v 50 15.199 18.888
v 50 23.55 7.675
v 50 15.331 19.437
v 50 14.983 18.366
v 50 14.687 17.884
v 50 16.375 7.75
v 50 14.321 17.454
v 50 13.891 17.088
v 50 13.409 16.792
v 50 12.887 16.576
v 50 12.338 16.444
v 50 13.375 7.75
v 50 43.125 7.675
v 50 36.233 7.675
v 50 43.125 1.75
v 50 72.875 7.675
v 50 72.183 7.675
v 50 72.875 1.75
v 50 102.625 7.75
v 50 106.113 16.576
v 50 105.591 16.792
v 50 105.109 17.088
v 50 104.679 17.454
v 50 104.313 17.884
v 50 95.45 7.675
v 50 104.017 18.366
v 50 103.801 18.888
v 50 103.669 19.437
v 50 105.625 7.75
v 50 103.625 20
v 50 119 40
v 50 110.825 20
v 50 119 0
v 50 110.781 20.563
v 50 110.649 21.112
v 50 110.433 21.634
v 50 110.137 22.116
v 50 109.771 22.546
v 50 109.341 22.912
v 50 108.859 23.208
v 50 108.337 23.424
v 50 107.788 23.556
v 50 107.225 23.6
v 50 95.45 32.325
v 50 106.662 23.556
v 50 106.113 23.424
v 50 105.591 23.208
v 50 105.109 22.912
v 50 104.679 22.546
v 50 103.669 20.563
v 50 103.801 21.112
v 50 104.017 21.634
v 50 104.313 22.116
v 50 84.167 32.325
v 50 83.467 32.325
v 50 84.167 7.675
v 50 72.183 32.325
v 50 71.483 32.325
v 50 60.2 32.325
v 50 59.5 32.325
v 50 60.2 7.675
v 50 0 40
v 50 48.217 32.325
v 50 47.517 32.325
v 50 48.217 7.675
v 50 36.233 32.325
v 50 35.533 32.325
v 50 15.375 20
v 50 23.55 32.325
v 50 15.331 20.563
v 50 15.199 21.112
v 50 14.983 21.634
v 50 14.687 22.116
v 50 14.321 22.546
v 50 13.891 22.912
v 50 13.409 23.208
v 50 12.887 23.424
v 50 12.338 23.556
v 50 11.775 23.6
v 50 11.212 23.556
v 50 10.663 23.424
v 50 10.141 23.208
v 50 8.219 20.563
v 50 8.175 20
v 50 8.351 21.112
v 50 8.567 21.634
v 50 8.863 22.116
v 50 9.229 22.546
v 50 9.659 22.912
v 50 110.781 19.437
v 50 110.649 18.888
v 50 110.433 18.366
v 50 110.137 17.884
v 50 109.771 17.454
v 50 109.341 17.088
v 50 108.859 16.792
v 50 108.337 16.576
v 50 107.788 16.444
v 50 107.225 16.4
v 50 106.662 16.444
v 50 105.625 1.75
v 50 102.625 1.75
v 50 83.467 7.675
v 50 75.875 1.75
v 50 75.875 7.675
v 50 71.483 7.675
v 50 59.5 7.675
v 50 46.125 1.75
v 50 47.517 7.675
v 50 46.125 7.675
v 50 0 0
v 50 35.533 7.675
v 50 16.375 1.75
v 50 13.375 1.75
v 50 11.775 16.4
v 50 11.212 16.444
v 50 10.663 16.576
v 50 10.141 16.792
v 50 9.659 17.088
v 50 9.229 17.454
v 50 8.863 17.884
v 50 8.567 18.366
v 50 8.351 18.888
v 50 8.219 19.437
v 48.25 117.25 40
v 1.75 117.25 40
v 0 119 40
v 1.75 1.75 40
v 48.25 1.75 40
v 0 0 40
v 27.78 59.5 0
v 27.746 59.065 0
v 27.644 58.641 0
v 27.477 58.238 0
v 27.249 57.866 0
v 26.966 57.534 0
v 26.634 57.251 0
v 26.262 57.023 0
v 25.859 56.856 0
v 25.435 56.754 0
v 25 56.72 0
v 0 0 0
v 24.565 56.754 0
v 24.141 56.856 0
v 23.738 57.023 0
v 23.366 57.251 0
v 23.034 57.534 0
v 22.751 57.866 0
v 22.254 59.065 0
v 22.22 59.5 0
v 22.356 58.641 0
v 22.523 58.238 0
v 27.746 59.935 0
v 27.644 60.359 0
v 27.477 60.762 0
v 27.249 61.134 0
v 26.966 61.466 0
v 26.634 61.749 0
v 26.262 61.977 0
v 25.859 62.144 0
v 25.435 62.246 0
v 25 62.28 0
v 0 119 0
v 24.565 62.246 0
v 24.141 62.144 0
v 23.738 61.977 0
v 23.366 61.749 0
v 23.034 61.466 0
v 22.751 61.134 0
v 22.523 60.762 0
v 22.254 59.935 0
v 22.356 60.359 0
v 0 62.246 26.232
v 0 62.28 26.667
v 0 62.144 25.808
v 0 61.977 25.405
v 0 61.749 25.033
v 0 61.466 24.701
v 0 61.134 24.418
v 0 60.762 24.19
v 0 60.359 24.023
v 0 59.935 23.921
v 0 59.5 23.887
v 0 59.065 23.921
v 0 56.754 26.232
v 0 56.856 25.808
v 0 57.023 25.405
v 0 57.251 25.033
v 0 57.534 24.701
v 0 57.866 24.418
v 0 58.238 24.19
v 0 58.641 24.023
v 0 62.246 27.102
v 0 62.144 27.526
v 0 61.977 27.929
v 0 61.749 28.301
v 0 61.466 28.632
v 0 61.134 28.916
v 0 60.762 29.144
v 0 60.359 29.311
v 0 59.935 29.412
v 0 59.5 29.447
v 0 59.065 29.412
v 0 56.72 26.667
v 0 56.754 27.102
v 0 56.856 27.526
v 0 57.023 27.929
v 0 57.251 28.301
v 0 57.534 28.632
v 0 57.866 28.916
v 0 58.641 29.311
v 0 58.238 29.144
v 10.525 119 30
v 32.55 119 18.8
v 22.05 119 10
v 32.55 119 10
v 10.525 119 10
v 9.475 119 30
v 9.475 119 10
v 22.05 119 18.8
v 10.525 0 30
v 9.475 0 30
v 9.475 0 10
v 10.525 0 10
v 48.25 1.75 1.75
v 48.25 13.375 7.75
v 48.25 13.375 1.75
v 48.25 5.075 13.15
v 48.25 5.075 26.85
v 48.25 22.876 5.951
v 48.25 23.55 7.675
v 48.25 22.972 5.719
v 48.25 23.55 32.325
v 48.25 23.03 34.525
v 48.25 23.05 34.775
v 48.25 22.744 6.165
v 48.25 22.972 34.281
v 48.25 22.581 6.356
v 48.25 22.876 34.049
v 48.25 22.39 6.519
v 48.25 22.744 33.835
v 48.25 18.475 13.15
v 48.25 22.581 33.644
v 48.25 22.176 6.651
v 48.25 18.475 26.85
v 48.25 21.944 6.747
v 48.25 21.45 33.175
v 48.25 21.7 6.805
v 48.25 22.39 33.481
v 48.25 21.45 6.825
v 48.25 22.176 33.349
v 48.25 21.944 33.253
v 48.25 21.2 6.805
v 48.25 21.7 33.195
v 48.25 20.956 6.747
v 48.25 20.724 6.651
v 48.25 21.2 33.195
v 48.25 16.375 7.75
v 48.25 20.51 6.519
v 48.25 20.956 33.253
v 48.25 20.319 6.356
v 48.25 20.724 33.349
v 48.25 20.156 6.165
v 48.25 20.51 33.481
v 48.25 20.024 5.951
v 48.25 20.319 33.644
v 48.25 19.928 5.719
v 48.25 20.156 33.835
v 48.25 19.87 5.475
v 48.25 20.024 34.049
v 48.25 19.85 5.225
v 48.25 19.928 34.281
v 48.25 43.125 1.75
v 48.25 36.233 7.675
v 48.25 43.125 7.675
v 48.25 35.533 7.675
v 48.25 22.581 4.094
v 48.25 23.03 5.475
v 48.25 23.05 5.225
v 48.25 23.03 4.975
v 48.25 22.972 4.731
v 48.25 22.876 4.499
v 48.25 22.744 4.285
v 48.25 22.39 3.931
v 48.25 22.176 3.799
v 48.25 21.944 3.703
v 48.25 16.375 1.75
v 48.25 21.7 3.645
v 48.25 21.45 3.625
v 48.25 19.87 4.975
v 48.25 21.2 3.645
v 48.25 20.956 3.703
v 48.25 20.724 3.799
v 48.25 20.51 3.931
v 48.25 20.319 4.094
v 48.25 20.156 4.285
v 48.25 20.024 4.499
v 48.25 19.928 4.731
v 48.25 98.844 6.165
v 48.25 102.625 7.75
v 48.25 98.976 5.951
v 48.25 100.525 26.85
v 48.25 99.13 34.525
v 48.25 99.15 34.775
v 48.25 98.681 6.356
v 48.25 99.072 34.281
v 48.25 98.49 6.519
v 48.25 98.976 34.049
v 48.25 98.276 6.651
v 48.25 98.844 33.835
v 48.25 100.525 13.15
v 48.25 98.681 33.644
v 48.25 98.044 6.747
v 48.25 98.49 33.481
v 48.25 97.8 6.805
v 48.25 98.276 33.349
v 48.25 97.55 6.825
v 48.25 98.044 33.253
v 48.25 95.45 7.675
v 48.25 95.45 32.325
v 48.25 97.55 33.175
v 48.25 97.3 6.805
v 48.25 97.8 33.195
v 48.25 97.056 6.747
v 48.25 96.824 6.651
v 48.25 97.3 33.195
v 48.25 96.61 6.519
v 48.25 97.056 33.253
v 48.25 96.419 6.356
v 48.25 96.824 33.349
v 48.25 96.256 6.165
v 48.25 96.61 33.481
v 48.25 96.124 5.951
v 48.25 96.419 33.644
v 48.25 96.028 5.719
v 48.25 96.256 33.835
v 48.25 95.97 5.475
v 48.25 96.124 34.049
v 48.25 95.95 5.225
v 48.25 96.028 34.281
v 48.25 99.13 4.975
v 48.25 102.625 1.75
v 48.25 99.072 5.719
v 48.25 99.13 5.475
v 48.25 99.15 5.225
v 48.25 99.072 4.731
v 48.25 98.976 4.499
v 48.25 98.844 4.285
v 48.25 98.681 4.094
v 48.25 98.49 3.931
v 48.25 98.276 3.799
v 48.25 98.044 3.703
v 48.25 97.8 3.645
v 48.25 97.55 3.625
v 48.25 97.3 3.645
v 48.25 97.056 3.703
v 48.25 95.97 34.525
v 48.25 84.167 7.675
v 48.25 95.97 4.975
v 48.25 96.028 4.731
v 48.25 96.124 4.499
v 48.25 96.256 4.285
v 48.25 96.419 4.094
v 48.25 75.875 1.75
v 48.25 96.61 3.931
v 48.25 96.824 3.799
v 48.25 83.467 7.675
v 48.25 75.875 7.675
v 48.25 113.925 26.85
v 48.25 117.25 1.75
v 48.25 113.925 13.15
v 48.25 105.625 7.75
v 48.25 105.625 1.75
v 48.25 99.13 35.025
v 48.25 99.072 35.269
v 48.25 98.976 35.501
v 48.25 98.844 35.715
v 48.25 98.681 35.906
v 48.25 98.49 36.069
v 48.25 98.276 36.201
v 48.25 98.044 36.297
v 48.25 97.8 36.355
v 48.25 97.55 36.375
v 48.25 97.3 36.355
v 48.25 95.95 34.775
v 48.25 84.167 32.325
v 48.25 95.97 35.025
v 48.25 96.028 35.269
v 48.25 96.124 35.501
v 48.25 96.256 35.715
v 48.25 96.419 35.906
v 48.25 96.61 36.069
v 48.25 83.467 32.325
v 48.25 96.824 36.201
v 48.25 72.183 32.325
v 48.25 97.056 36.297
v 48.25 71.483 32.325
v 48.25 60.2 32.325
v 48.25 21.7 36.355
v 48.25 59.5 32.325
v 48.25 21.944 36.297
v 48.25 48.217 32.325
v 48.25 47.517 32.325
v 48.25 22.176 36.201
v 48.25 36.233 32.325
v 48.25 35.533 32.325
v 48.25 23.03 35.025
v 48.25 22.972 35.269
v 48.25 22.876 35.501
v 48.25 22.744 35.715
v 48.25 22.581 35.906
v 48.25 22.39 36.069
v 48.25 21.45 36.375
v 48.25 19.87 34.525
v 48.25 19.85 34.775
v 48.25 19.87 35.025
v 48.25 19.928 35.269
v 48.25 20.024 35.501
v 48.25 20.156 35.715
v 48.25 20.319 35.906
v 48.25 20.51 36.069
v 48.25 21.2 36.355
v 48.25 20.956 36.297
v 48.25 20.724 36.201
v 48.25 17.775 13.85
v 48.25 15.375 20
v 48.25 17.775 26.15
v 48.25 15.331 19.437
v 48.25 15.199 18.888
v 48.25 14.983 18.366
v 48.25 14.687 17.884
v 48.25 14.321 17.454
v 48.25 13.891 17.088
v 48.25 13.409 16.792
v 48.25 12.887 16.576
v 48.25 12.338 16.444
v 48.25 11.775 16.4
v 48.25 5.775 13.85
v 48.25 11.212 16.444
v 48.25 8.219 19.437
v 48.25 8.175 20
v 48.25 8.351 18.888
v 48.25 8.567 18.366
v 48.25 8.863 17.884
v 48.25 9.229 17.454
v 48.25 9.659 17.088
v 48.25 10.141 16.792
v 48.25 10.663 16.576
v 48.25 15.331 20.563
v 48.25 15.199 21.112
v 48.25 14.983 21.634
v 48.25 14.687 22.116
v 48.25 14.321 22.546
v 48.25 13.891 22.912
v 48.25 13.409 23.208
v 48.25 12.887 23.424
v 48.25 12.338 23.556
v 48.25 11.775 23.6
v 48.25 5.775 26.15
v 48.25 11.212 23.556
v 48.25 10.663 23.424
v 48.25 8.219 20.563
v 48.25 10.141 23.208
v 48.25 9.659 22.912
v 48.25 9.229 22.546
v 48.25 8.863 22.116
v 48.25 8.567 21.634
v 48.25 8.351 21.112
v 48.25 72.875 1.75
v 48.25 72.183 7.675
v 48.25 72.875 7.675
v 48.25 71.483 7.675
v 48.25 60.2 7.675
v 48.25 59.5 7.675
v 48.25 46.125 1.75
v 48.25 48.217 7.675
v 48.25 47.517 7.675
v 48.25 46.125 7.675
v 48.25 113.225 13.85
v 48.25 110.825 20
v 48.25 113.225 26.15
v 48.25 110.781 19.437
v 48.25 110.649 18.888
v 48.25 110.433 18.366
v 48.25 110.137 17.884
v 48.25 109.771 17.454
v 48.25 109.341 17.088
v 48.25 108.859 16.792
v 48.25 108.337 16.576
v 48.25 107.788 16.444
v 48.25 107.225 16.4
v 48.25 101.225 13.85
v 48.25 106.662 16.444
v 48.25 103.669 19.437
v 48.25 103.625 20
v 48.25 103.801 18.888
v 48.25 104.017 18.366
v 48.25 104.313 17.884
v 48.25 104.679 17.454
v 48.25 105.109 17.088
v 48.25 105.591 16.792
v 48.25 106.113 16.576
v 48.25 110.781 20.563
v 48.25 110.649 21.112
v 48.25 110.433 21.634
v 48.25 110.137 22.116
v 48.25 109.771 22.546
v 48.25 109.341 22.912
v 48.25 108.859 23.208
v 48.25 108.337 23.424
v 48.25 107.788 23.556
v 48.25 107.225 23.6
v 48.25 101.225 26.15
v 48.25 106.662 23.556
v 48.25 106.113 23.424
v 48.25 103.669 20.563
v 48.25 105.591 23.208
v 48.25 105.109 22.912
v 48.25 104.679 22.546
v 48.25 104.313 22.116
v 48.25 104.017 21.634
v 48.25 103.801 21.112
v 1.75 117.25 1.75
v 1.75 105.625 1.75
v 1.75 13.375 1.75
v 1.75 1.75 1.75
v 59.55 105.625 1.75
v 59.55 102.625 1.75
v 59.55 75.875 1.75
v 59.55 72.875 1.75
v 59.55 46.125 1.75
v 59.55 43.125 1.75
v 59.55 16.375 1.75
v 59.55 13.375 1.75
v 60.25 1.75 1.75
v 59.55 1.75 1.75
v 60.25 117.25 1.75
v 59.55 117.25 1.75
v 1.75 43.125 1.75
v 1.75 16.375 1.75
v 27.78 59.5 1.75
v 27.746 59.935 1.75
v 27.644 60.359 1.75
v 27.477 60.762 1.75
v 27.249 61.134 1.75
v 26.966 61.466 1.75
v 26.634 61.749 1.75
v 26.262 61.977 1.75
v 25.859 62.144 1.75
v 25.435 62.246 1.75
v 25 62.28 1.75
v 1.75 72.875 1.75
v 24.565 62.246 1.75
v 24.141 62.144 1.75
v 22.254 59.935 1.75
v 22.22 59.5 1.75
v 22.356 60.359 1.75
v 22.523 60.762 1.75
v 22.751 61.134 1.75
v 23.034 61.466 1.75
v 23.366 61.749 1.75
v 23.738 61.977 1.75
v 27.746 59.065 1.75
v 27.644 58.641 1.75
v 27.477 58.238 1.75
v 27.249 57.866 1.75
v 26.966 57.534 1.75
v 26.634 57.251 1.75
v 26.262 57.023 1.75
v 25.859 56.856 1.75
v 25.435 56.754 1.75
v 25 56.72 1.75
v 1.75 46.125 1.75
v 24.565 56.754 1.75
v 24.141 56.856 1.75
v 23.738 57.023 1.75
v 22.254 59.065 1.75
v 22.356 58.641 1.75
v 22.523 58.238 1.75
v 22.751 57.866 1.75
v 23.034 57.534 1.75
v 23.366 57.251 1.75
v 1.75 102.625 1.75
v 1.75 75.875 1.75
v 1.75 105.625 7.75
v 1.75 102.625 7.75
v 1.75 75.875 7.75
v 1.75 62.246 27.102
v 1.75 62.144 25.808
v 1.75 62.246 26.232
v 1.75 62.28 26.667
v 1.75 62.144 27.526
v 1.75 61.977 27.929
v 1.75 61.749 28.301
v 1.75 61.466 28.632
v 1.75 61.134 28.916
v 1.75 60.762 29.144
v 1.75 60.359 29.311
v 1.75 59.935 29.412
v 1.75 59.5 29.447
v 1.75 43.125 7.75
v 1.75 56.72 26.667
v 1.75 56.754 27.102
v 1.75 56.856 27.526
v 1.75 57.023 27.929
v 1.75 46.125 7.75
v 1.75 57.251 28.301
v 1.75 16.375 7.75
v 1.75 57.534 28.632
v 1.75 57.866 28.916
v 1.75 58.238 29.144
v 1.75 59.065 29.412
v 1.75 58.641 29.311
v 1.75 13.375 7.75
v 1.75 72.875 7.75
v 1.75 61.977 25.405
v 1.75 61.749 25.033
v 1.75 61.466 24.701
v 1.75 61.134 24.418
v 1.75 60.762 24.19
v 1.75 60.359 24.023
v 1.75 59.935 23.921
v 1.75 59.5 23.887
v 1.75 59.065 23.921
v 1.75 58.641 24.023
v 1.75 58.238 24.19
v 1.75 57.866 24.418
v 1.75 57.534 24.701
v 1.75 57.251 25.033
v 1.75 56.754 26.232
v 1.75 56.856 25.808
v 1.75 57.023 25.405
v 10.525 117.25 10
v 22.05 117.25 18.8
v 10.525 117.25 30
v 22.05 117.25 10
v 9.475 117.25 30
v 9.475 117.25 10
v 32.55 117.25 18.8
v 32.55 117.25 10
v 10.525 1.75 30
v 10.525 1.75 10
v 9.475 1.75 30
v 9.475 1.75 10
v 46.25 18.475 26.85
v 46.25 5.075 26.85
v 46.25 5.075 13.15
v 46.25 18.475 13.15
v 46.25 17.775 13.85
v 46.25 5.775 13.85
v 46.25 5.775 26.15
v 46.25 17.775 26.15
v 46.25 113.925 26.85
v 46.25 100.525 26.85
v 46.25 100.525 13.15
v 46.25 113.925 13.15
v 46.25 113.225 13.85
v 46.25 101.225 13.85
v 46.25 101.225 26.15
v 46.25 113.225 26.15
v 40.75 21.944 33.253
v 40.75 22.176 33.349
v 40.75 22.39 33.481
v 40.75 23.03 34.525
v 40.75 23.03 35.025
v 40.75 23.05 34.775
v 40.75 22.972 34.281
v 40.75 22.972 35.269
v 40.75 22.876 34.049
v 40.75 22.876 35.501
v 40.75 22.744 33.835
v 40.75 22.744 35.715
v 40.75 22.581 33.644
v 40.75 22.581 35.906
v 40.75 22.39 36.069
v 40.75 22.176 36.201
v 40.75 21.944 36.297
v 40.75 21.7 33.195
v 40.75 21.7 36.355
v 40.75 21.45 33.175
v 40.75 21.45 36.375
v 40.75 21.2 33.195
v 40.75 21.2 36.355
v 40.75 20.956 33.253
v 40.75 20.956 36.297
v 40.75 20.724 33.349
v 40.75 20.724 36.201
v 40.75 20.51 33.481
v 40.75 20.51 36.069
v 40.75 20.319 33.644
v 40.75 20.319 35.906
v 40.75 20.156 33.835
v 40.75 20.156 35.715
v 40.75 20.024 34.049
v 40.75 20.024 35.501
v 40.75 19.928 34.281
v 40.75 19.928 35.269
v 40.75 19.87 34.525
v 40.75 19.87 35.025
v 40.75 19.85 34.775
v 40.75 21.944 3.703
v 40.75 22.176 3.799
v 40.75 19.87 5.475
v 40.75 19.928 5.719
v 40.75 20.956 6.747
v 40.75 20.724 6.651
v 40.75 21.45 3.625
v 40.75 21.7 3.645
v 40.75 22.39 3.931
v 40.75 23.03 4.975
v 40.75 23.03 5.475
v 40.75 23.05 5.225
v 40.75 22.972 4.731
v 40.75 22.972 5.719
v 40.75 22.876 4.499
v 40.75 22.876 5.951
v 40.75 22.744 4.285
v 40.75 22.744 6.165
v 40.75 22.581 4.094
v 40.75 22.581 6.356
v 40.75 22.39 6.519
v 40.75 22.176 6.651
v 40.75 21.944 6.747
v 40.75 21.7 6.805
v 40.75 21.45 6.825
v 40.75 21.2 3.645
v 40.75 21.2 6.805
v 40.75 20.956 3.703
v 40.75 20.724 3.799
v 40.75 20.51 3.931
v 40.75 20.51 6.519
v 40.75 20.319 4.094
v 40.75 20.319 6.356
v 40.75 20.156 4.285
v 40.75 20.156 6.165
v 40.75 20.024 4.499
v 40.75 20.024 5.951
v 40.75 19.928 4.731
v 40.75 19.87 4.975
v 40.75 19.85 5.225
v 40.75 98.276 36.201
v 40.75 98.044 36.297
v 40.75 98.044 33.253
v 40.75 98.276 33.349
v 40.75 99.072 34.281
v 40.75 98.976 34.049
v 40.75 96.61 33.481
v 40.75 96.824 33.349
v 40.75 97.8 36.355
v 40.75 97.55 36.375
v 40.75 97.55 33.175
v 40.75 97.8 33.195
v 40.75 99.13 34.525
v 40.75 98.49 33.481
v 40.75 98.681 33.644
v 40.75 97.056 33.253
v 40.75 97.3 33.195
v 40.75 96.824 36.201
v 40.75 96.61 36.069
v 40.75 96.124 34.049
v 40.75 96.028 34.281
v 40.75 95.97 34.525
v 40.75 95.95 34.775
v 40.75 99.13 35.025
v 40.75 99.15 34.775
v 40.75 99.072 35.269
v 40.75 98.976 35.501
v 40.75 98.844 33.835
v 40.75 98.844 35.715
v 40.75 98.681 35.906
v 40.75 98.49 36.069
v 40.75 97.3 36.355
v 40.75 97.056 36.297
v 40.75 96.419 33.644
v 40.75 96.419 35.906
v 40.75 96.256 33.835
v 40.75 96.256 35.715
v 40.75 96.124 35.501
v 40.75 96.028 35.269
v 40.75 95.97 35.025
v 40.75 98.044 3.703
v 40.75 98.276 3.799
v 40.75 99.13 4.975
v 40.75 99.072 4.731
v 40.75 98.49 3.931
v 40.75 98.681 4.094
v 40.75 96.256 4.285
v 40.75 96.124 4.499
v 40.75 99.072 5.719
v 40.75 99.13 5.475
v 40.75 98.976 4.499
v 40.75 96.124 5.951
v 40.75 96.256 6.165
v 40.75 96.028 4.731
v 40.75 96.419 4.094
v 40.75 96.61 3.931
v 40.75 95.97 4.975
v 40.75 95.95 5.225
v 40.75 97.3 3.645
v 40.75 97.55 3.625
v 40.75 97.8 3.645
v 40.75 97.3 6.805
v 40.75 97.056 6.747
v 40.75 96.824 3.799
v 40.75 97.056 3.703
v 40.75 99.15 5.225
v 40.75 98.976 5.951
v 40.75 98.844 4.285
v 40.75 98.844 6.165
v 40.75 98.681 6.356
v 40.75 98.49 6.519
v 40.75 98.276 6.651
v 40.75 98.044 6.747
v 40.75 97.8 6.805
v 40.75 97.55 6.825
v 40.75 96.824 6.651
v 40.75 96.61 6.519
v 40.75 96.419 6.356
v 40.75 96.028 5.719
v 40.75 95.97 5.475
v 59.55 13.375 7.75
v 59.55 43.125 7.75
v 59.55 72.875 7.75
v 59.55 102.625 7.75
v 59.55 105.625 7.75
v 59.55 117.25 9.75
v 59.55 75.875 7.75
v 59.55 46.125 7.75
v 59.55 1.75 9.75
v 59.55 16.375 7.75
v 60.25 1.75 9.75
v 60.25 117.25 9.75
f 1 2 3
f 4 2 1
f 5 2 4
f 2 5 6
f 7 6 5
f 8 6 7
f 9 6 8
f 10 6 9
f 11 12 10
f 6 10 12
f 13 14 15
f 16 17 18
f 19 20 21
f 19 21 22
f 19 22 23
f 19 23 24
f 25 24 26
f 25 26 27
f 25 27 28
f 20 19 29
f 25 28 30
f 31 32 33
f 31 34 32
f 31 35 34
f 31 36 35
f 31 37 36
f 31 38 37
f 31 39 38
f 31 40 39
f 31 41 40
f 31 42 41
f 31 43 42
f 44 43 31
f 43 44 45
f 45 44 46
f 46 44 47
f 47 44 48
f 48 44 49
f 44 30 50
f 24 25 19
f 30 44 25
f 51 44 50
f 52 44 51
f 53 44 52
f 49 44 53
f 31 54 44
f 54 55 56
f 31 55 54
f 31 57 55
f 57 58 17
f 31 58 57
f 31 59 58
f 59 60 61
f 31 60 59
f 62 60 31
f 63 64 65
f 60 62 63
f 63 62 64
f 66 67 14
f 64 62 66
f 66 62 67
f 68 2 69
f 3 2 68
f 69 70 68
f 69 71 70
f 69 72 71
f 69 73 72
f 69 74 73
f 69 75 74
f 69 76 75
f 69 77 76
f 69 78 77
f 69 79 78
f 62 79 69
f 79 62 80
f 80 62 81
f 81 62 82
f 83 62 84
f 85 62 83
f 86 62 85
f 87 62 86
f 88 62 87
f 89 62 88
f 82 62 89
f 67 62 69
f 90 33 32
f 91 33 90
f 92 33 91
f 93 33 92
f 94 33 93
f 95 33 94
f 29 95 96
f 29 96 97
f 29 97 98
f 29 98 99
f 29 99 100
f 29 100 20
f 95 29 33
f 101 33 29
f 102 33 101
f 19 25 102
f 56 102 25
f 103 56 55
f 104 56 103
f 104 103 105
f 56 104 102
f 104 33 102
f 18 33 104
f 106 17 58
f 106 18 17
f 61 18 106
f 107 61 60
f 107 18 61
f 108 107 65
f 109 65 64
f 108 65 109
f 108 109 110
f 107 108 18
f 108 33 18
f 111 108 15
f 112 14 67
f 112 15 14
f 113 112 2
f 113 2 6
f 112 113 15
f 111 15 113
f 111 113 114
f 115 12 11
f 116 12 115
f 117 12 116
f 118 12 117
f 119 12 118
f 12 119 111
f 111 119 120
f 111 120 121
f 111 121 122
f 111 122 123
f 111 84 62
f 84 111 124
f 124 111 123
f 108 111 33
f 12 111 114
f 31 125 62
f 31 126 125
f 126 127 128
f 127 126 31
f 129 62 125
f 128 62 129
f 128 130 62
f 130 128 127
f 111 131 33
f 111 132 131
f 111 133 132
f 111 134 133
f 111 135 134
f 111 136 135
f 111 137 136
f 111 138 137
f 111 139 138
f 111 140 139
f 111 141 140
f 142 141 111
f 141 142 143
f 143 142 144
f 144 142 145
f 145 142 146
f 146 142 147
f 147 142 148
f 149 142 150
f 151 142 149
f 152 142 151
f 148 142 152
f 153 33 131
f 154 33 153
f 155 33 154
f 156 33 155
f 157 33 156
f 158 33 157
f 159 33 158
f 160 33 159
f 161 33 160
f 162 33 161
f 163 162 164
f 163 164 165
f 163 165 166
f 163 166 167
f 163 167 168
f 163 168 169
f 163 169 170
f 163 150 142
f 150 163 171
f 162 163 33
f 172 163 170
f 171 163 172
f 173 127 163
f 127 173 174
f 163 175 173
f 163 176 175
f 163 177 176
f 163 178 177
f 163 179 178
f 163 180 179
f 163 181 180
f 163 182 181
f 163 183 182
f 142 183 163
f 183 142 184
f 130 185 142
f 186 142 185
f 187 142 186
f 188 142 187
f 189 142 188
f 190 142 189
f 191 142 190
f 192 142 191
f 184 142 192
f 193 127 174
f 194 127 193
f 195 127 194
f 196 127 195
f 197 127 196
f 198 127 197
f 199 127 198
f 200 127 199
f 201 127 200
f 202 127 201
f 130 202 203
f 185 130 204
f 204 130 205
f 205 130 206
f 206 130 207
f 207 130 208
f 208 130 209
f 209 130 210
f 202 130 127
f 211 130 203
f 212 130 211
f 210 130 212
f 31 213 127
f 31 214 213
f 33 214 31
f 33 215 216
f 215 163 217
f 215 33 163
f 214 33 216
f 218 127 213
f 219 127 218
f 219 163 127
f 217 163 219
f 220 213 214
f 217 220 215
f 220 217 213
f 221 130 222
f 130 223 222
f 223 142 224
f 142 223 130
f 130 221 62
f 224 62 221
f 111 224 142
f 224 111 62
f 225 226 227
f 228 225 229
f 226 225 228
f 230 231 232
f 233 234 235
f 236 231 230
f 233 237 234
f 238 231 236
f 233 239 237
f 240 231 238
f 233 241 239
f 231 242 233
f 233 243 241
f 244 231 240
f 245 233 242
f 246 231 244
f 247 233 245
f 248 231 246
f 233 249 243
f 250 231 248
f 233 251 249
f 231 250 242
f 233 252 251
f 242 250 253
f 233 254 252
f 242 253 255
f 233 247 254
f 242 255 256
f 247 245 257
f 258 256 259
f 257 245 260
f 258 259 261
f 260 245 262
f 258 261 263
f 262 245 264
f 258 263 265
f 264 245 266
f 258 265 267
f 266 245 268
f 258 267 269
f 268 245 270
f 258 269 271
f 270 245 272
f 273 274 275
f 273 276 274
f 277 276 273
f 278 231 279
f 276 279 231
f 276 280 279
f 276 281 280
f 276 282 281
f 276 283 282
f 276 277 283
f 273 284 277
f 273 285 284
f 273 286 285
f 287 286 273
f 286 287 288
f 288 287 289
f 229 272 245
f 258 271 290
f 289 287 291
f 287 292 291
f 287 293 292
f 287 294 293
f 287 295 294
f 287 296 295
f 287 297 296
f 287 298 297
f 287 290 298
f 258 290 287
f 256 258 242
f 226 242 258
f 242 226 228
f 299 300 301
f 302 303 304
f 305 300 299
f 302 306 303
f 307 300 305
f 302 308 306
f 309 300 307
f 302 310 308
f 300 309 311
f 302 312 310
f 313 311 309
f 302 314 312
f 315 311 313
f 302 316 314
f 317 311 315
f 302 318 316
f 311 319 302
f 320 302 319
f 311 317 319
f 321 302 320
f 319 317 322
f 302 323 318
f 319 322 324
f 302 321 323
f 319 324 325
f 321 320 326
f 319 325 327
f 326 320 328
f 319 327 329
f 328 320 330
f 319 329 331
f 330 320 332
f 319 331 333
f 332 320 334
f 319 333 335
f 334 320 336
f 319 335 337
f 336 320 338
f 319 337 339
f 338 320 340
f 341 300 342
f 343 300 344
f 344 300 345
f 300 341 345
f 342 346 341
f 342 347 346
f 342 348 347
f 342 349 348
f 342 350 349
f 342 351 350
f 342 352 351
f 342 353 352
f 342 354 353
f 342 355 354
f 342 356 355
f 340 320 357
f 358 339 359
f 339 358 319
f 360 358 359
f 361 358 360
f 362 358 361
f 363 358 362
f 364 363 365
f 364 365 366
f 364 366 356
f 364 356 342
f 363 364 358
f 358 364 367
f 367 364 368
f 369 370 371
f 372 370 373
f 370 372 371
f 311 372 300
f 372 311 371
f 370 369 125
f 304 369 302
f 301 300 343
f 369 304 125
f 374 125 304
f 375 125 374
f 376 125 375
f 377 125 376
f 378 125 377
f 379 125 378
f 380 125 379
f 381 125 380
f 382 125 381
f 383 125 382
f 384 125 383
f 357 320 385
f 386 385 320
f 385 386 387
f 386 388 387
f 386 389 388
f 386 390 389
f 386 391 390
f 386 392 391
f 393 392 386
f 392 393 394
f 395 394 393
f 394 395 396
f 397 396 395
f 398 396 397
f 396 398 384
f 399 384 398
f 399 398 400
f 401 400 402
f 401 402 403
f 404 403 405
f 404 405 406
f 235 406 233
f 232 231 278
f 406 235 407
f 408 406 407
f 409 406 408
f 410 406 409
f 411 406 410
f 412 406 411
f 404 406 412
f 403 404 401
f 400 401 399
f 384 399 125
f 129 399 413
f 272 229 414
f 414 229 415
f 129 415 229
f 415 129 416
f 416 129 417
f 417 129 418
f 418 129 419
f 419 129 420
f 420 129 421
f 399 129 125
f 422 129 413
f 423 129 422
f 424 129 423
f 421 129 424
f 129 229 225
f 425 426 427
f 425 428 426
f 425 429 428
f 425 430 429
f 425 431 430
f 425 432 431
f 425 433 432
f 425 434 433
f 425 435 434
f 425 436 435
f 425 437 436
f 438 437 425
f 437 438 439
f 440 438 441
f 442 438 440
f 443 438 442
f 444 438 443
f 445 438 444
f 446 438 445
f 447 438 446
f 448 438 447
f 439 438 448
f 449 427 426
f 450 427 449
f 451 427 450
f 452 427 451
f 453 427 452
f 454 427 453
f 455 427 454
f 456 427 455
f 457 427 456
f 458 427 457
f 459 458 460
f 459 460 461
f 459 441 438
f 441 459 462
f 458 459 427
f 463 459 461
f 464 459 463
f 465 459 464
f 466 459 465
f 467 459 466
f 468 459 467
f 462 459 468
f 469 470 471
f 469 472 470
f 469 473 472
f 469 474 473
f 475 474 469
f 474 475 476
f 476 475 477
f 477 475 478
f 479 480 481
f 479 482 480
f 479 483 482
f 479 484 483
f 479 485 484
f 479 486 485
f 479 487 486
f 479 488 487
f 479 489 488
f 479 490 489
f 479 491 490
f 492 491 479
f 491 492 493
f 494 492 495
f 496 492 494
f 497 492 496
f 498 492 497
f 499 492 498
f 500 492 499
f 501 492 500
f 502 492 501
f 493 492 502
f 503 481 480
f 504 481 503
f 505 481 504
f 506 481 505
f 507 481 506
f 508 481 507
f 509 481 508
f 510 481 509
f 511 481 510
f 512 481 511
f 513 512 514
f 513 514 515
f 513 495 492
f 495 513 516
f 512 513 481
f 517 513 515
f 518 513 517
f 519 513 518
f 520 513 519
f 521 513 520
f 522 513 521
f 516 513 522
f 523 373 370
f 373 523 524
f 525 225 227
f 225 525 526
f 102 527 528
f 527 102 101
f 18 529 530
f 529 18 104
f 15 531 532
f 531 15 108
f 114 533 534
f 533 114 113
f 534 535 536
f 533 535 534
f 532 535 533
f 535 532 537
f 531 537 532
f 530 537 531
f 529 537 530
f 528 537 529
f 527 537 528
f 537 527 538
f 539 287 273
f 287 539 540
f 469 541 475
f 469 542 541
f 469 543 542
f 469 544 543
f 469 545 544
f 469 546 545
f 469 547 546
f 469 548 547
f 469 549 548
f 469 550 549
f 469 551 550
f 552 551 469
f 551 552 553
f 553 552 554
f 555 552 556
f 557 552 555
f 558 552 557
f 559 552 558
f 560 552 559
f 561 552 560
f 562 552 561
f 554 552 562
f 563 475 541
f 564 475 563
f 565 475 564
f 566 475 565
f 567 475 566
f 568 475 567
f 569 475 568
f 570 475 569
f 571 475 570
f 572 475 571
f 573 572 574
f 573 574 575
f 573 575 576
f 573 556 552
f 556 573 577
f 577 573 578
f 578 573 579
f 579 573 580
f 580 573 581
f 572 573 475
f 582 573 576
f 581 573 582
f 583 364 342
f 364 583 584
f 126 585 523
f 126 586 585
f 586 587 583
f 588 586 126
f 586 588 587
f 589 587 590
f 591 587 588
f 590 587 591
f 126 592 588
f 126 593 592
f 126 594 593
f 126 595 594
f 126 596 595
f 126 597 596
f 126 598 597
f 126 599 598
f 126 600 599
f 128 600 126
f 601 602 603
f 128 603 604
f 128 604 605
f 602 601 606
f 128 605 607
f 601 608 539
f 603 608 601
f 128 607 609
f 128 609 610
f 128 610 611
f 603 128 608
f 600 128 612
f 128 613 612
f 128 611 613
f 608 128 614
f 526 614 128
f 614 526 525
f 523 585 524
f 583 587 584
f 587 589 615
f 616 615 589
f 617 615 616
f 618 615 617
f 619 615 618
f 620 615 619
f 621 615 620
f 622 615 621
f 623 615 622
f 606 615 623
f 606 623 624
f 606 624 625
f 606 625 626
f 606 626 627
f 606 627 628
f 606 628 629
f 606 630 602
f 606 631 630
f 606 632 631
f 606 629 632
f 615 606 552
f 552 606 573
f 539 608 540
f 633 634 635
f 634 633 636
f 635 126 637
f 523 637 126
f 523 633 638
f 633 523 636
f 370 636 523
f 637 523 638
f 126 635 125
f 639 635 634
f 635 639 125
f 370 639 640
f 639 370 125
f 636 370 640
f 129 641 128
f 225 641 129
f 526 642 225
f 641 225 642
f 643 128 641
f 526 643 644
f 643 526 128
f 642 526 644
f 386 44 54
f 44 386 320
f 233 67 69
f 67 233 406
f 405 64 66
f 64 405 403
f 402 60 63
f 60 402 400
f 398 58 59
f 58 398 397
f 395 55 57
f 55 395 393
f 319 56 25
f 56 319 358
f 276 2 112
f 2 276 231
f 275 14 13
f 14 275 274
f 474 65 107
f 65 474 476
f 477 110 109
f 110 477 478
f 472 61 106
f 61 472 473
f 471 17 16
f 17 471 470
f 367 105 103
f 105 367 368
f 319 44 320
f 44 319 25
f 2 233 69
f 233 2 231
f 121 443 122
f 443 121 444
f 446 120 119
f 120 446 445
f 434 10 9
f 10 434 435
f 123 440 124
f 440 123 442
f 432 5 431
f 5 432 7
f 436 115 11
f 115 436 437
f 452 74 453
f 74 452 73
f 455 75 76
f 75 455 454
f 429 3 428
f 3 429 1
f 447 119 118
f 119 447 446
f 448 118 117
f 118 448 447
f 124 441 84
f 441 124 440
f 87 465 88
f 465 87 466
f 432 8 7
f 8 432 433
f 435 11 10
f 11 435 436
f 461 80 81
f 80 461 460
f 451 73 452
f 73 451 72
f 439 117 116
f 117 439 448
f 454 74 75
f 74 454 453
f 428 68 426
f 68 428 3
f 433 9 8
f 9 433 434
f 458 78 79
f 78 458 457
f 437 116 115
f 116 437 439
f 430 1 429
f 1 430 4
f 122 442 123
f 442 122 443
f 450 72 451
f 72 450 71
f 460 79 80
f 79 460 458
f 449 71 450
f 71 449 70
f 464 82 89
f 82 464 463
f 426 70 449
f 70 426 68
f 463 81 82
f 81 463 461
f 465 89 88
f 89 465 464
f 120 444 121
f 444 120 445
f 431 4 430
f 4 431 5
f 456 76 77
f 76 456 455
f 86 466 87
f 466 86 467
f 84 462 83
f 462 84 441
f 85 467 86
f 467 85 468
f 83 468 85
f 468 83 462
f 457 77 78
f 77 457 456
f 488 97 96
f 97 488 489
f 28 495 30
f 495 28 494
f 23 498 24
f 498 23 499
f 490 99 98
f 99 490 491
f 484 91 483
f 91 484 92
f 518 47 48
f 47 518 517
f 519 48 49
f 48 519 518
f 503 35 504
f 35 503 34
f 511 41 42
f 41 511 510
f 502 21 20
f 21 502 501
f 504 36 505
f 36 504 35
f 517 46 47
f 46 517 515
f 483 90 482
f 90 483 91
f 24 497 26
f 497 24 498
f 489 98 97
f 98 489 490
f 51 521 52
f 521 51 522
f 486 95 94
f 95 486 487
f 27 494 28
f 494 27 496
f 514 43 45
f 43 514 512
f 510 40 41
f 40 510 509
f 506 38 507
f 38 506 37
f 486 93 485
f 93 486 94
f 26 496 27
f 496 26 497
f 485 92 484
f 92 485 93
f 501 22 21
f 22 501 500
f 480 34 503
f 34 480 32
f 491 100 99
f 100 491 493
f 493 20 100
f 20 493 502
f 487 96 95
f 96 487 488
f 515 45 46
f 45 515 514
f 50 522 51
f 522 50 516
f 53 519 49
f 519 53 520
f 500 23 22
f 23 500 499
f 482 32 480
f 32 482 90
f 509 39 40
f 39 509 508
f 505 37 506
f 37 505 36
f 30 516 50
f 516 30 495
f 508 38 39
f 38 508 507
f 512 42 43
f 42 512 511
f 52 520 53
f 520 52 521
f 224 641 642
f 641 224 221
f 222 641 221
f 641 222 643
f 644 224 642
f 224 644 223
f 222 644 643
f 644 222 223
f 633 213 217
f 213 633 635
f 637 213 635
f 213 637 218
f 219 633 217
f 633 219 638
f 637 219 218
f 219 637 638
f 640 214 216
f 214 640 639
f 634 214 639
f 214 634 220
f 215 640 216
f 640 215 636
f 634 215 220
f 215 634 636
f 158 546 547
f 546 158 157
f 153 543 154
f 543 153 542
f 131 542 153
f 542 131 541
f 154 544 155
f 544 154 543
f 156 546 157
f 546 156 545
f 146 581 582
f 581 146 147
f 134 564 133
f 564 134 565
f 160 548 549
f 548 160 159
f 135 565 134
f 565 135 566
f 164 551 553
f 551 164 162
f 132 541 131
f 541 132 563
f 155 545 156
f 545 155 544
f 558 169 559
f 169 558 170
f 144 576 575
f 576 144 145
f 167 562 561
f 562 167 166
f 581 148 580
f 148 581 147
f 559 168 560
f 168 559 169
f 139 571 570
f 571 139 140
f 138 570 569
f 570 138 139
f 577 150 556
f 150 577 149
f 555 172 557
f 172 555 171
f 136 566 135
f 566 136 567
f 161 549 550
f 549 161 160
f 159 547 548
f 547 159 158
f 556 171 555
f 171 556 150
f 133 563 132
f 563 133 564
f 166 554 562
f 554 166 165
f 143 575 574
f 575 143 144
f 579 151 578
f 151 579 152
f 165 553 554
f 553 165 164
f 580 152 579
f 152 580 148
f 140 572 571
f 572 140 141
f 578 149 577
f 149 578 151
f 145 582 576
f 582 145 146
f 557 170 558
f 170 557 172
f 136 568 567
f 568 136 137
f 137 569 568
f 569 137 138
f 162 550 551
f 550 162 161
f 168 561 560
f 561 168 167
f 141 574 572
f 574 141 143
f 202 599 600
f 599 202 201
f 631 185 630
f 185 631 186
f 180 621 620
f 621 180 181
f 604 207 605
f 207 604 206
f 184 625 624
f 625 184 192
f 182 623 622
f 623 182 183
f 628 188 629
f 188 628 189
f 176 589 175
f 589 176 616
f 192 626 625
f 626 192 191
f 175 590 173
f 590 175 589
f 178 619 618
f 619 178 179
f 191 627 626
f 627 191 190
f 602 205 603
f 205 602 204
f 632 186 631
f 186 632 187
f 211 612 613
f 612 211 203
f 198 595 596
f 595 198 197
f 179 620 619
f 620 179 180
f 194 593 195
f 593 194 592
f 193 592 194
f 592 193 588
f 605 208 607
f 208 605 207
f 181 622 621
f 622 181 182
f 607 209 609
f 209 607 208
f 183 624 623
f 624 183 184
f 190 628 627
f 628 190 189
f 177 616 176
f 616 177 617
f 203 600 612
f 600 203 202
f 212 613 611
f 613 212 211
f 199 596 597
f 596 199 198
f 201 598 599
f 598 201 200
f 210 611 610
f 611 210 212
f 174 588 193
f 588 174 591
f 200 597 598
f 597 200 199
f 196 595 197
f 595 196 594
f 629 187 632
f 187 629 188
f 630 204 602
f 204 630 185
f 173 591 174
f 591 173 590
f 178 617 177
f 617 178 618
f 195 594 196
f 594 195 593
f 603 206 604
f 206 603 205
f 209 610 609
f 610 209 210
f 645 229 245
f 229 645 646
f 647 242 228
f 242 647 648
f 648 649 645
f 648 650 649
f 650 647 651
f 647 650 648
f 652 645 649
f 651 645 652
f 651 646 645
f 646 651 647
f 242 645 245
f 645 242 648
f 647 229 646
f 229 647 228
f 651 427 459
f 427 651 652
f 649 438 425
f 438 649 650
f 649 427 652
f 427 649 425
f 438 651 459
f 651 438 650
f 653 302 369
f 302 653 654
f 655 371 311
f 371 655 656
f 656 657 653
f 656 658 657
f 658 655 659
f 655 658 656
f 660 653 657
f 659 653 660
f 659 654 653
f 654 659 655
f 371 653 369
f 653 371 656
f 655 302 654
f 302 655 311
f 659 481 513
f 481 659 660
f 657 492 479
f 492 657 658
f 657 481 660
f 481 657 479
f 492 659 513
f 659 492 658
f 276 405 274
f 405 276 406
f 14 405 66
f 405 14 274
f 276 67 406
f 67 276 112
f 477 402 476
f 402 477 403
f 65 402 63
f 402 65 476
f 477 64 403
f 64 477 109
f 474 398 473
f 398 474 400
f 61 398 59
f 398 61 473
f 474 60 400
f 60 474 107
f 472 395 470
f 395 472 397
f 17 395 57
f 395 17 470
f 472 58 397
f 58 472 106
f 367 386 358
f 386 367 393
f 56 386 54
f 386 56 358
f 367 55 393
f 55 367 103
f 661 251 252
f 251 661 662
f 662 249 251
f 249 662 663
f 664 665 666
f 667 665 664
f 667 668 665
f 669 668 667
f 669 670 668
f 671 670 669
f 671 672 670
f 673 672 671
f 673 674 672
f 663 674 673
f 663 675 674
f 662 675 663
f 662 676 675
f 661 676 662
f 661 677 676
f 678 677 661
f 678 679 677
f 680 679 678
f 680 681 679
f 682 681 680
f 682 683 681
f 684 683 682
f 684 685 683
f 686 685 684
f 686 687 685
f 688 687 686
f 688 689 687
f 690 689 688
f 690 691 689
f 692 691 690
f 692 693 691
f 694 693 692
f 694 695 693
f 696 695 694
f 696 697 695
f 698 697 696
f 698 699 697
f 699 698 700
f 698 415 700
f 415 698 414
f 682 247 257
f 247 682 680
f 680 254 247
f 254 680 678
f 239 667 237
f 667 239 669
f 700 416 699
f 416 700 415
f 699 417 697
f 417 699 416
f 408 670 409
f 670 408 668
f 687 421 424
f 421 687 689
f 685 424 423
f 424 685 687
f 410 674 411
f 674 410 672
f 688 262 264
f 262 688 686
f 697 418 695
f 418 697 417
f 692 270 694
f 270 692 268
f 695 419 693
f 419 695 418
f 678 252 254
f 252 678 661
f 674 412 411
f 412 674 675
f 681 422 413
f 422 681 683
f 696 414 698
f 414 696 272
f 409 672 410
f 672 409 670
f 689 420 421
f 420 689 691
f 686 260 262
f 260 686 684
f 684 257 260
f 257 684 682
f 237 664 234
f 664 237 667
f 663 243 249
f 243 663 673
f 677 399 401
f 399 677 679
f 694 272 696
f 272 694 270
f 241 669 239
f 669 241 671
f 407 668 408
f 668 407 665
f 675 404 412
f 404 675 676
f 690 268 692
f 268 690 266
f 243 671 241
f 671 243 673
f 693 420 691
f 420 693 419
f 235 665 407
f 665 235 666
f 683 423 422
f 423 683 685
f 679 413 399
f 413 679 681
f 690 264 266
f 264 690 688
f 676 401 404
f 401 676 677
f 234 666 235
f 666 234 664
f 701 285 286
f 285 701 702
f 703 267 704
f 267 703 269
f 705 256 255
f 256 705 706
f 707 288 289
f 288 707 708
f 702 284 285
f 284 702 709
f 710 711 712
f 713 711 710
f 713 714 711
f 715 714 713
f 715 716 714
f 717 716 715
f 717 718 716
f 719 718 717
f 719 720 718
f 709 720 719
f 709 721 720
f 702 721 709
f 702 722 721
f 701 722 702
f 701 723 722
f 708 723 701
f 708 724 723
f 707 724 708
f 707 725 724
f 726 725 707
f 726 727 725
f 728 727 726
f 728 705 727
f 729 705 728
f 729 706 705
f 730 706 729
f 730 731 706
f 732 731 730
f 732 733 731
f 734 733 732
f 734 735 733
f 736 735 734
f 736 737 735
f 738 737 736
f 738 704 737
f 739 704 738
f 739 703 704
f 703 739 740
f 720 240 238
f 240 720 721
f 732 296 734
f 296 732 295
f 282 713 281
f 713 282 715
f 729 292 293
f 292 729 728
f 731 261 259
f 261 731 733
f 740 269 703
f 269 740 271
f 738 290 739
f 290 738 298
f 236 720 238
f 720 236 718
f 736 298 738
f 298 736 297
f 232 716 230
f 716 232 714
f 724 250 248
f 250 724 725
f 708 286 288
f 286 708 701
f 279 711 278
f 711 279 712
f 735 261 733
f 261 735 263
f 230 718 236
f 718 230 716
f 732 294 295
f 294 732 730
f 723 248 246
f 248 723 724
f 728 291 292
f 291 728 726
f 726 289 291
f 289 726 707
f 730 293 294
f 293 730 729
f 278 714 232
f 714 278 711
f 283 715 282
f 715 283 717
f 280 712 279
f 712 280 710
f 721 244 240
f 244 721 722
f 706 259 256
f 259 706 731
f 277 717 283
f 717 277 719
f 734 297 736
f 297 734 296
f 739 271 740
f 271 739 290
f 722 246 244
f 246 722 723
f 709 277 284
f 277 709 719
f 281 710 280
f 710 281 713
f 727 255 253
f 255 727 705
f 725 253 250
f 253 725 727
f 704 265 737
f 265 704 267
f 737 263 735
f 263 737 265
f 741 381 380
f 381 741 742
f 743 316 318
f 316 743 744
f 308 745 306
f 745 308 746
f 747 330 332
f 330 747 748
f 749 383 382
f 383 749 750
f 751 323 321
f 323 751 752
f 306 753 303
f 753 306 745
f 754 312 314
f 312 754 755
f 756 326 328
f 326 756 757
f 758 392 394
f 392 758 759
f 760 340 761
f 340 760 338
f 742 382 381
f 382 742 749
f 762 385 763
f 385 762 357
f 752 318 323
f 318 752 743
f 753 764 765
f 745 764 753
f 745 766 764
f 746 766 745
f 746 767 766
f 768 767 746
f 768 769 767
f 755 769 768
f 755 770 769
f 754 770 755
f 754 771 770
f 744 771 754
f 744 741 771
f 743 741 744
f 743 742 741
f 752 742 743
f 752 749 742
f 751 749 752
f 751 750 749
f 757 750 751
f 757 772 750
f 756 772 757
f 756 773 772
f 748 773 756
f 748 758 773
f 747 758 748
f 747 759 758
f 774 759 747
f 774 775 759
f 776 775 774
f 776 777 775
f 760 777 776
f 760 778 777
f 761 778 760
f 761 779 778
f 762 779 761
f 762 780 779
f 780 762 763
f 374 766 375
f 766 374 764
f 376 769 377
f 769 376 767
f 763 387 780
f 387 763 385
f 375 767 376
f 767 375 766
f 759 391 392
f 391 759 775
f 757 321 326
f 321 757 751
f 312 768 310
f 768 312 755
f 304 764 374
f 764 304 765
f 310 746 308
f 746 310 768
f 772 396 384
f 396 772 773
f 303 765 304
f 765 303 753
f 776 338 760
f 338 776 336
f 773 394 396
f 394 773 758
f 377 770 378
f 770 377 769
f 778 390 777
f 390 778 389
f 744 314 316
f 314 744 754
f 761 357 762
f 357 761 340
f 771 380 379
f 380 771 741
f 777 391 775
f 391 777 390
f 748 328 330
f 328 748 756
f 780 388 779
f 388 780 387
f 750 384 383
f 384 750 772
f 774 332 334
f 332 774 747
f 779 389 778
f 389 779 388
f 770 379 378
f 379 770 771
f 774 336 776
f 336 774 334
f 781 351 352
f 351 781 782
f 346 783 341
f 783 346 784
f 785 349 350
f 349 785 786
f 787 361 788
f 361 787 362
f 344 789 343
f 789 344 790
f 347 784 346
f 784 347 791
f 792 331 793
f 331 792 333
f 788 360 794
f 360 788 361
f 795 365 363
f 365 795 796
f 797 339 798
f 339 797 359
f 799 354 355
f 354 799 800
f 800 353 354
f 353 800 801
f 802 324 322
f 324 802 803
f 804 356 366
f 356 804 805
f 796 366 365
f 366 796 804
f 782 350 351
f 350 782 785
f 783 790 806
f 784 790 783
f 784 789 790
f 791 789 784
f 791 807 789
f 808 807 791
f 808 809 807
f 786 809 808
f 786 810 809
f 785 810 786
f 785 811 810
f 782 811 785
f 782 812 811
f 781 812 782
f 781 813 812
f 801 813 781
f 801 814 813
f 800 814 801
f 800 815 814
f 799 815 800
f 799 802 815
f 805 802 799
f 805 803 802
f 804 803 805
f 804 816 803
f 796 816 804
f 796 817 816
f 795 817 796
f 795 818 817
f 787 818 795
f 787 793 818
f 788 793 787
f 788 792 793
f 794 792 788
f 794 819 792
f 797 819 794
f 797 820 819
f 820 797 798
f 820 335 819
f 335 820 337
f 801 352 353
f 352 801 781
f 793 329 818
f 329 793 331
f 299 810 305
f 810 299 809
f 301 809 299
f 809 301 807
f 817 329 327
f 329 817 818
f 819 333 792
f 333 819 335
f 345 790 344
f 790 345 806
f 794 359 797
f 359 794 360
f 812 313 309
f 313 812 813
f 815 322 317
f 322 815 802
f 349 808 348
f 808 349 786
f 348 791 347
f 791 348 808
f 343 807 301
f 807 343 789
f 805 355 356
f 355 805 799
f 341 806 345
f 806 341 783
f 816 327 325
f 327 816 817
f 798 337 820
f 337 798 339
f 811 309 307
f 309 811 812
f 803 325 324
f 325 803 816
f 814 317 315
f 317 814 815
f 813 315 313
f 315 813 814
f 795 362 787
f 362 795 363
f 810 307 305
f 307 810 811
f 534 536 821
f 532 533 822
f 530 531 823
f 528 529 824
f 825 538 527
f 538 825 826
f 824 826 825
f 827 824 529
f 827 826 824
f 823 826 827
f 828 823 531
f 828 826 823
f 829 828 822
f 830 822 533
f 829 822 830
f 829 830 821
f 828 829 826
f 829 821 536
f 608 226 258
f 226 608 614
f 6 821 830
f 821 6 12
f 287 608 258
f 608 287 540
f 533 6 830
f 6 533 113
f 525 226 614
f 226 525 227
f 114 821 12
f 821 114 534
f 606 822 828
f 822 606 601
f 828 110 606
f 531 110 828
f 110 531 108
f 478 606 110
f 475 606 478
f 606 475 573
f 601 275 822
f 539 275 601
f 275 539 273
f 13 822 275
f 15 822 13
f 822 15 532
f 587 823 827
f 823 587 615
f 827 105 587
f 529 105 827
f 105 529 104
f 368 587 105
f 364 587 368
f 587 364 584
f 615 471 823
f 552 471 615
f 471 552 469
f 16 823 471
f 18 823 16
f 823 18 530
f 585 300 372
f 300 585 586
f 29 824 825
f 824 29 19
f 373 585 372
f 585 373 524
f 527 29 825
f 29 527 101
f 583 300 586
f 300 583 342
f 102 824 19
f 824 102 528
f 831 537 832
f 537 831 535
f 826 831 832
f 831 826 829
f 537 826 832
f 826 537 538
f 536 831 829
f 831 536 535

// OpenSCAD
//everything is in units of millimeters
resolution = 0.35;

//PCB board 60mm x 25mm???
mainDepth = 50;
mainWidth = 119;
mainHeight = 40;
mainShellThickness = 5 * resolution;

displayWidth = 71.9;
displayDepth = mainShellThickness;
displayHeight = 24.65;
displaySupportColumnWidth = resolution * 2;
displayScrewHoleYoffset = 2.1;
displayScrewBottomHoleZoffset = 2.45;
displayScrewHoleCylinderDepth = 7.5;
knobHoleYoffset = (mainWidth - displayWidth) / 4;
knobHoleZoffset = (mainHeight / 2);
knobHoleRadius = 3.6;
knobHoleDepth = mainShellThickness;
knobScrewHoleYoffset = 9;
knobScrewBottomHoleZoffset = 6;
knobScrewTopHoleZoffset = 11;
knobScrewHoleRadius = 1.6;
knobSupportWallThickness = resolution * 2;
knobSupportWidth = 12 + 2 * knobSupportWallThickness;
knobSupportHeight = 12.3 + 2 * knobSupportWallThickness;
knobSupportDepth = 2;
airSlotDepth = resolution * 3;
airSlotWidth = mainShellThickness;
airSlotHeight = mainHeight * 0.5;
usbSlotDepth = 10.5;
usbSlotWidth = mainShellThickness;
usbSlotHeight = 8.8;
mountingHoleRadius = 2.78;
cylinderFragments = 40;
breadboardDepth = 57.8;
breadboardPlatformHeight = 6;
breadboardPlatformBeamWidth = 3;
breadboardFenceHeight = breadboardPlatformHeight + 3;
breadboardFenceThickness = resolution * 2;

union() {
  difference() {
    //main shell
    cube([mainDepth, mainWidth, mainHeight]);
    translate([mainShellThickness, mainShellThickness, mainShellThickness]) {//cut-out inside
      cube([mainDepth - mainShellThickness * 2, mainWidth - mainShellThickness * 2, mainHeight]);
    };
    
    //display
    translate([mainDepth - displayDepth, mainWidth/2 - displayWidth/2, mainHeight/2 - displayHeight/2]) {
      cube([displayDepth,displayWidth,displayHeight]);
    };
    
    //display top-left hole
    /*translate([mainDepth - displayDepth, mainWidth/2 - displayWidth/2 - displayScrewHoleYoffset, mainHeight/2 + displayHeight/2 + displayScrewBottomHoleZoffset]) {
      rotate([0,90,0]) {
        cylinder(knobHoleDepth,knobScrewHoleRadius,knobScrewHoleRadius,$fn=cylinderFragments);
      };
    };*/
    
    //display bottom-left hole
    /*translate([mainDepth - displayDepth, mainWidth/2 - displayWidth/2 - displayScrewHoleYoffset, mainHeight/2 - displayHeight/2 - displayScrewBottomHoleZoffset]) {
      rotate([0,90,0]) {
        cylinder(knobHoleDepth,knobScrewHoleRadius,knobScrewHoleRadius,$fn=cylinderFragments);
      };
    };*/
    
    //display top-right hole
    /*translate([mainDepth - displayDepth, mainWidth/2 + displayWidth/2 + displayScrewHoleYoffset, mainHeight/2 + displayHeight/2 + displayScrewBottomHoleZoffset]) {
      rotate([0,90,0]) {
        cylinder(knobHoleDepth,knobScrewHoleRadius,knobScrewHoleRadius,$fn=cylinderFragments);
      };
    };*/
    
    //display bottom-right hole
    /*translate([mainDepth - displayDepth, mainWidth/2 + displayWidth/2 + displayScrewHoleYoffset, mainHeight/2 - displayHeight/2 - displayScrewBottomHoleZoffset]) {
      rotate([0,90,0]) {
        cylinder(knobHoleDepth,knobScrewHoleRadius,knobScrewHoleRadius,$fn=cylinderFragments);
      };
    };*/
    
    //left knob
    translate([mainDepth - knobHoleDepth, knobHoleYoffset, knobHoleZoffset]) {
      rotate([0,90,0]) {
        cylinder(knobHoleDepth,knobHoleRadius,knobHoleRadius,$fn=cylinderFragments);
      };
    };
    
    //left knob bottom screw hole
    /*translate([mainDepth - knobHoleDepth, knobHoleYoffset + knobScrewHoleYoffset, knobHoleZoffset - knobScrewBottomHoleZoffset]) {
      rotate([0,90,0]) {
        cylinder(knobHoleDepth,knobScrewHoleRadius,knobScrewHoleRadius,$fn=cylinderFragments);
      };
    };*/
    
    //left knob top screw hole
    /*translate([mainDepth - knobHoleDepth, knobHoleYoffset + knobScrewHoleYoffset, knobHoleZoffset + knobScrewTopHoleZoffset]) {
      rotate([0,90,0]) {
        cylinder(knobHoleDepth,knobScrewHoleRadius,knobScrewHoleRadius,$fn=cylinderFragments);
      };
    };*/
    
    //right knob
    translate([mainDepth - knobHoleDepth, mainWidth - knobHoleYoffset, knobHoleZoffset]) {
      rotate([0,90,0]) {
        cylinder(knobHoleDepth,knobHoleRadius,knobHoleRadius,$fn=cylinderFragments);
      };
    };
    
    //right knob bottom screw hole
    /*translate([mainDepth - knobHoleDepth, mainWidth - knobHoleYoffset + knobScrewHoleYoffset, knobHoleZoffset - knobScrewBottomHoleZoffset]) {
      rotate([0,90,0]) {
        cylinder(knobHoleDepth,knobScrewHoleRadius,knobScrewHoleRadius,$fn=cylinderFragments);
      };
    };*/
    
    //right knob top screw hole
    /*translate([mainDepth - knobHoleDepth, mainWidth - knobHoleYoffset + knobScrewHoleYoffset, knobHoleZoffset + knobScrewTopHoleZoffset]) {
      rotate([0,90,0]) {
        cylinder(knobHoleDepth,knobScrewHoleRadius,knobScrewHoleRadius,$fn=cylinderFragments);
      };
    };*/
    
    //air slot left
    translate([mainDepth/5 - airSlotDepth/2, 0, mainHeight/2 - airSlotHeight/2]) {
      cube([airSlotDepth, airSlotWidth, airSlotHeight]);
    };
    
    //air slot right
    translate([mainDepth/5 - airSlotDepth/2, mainWidth - airSlotWidth, mainHeight/2 - airSlotHeight/2]) {
      cube([airSlotDepth, airSlotWidth, airSlotHeight]);
    };
    
    //usb cable slot right side
    translate([breadboardDepth/2 - usbSlotDepth/2 - 1.6, mainWidth - usbSlotWidth, breadboardPlatformHeight + 4]) {
      cube([usbSlotDepth, usbSlotWidth, usbSlotHeight]);
    };
    
    //bottom mounting hole
    translate([mainDepth/2, mainWidth/2, 0]) {
      cylinder(mainShellThickness, mountingHoleRadius, mountingHoleRadius,$fn=cylinderFragments);
    };
    
    //back mounting hole
    translate([0, mainWidth/2, mainHeight/3 * 2]) {
      rotate([0,90,0]) {
        cylinder(mainShellThickness, mountingHoleRadius, mountingHoleRadius,$fn=cylinderFragments);
      };
    };
  };
  
  //Display support column #1
  translate([mainDepth - displayDepth, mainWidth/2 - displayWidth/2 + displayWidth/6, mainHeight/2 - displayHeight/2]) {
      cube([displayDepth,displaySupportColumnWidth,displayHeight]);
  };
  
  //Display support column #2
  translate([mainDepth - displayDepth, mainWidth/2 - displayWidth/2 + displayWidth/6 * 2, mainHeight/2 - displayHeight/2]) {
      cube([displayDepth,displaySupportColumnWidth,displayHeight]);
  };
  
  //Display support column #3 (middle column)
  translate([mainDepth - displayDepth, mainWidth/2, mainHeight/2 - displayHeight/2]) {
      cube([displayDepth,displaySupportColumnWidth,displayHeight]);
  };
  
  //Display support column #4
  translate([mainDepth - displayDepth, mainWidth/2 + displayWidth/6, mainHeight/2 - displayHeight/2]) {
      cube([displayDepth,displaySupportColumnWidth,displayHeight]);
  };
  
  //Display support column #5
  translate([mainDepth - displayDepth, mainWidth/2 + displayWidth/6 * 2, mainHeight/2 - displayHeight/2]) {
      cube([displayDepth,displaySupportColumnWidth,displayHeight]);
  };
  
  //Left Knob Support Structure
  difference() {
    //cube of support structure
    translate([mainDepth - mainShellThickness - knobSupportDepth, knobHoleYoffset - knobSupportWidth / 2, knobHoleZoffset - knobSupportHeight / 2]) {
      cube([knobSupportDepth, knobSupportWidth, knobSupportHeight]);
    }
    
    //hollowing out the center
    translate([mainDepth - mainShellThickness - knobSupportDepth, knobHoleYoffset - knobSupportWidth / 2 + knobSupportWallThickness, knobHoleZoffset - knobSupportHeight / 2 + knobSupportWallThickness]) {
      cube([knobSupportDepth, knobSupportWidth - knobSupportWallThickness * 2, knobSupportHeight - knobSupportWallThickness * 2]);
    }
  }
  
  //Right Knob Support Structure
  difference() {
    //cube of support structure
    translate([mainDepth - mainShellThickness - knobSupportDepth, mainWidth - knobHoleYoffset - knobSupportWidth / 2, knobHoleZoffset - knobSupportHeight / 2]) {
      cube([knobSupportDepth, knobSupportWidth, knobSupportHeight]);
    }
    
    //hollowing out the center
    translate([mainDepth - mainShellThickness - knobSupportDepth, mainWidth - knobHoleYoffset - knobSupportWidth / 2 + knobSupportWallThickness, knobHoleZoffset - knobSupportHeight / 2 + knobSupportWallThickness]) {
      cube([knobSupportDepth, knobSupportWidth - knobSupportWallThickness * 2, knobSupportHeight - knobSupportWallThickness * 2]);
    }
  }
  
  //display top-left hole support
  translate([mainDepth - mainShellThickness - displayScrewHoleCylinderDepth, mainWidth/2 - displayWidth/2 - displayScrewHoleYoffset, mainHeight/2 + displayHeight/2 + displayScrewBottomHoleZoffset]) {
    rotate([0,90,0]) {
      cylinder(displayScrewHoleCylinderDepth,knobScrewHoleRadius,knobScrewHoleRadius,$fn=cylinderFragments);
    };
  };
  
  //display bottom-left hole support
  translate([mainDepth - mainShellThickness - displayScrewHoleCylinderDepth, mainWidth/2 - displayWidth/2 - displayScrewHoleYoffset, mainHeight/2 - displayHeight/2 - displayScrewBottomHoleZoffset]) {
    rotate([0,90,0]) {
      cylinder(displayScrewHoleCylinderDepth,knobScrewHoleRadius,knobScrewHoleRadius,$fn=cylinderFragments);
    };
  };
  
  //display top-right hole support
  translate([mainDepth - mainShellThickness - displayScrewHoleCylinderDepth, mainWidth/2 + displayWidth/2 + displayScrewHoleYoffset, mainHeight/2 + displayHeight/2 + displayScrewBottomHoleZoffset]) {
    rotate([0,90,0]) {
      cylinder(displayScrewHoleCylinderDepth,knobScrewHoleRadius,knobScrewHoleRadius,$fn=cylinderFragments);
    };
  };
  
  //display bottom-right hole support
  translate([mainDepth - mainShellThickness - displayScrewHoleCylinderDepth, mainWidth/2 + displayWidth/2 + displayScrewHoleYoffset, mainHeight/2 - displayHeight/2 - displayScrewBottomHoleZoffset]) {
    rotate([0,90,0]) {
      cylinder(displayScrewHoleCylinderDepth,knobScrewHoleRadius,knobScrewHoleRadius,$fn=cylinderFragments);
    };
  };
  

  //breadboard platform #1 (furthest left)
  translate([mainShellThickness, mainWidth/8 - breadboardPlatformBeamWidth/2, mainShellThickness]) {
    cube([breadboardDepth, breadboardPlatformBeamWidth, breadboardPlatformHeight]);
  };
  
  //breadboard platform #2
  translate([mainShellThickness, mainWidth/8 * 3 - breadboardPlatformBeamWidth/2, mainShellThickness]) {
    cube([breadboardDepth, breadboardPlatformBeamWidth, breadboardPlatformHeight]);
  };
  
  //breadboard platform #3
  translate([mainShellThickness, mainWidth/8 * 5 - breadboardPlatformBeamWidth/2, mainShellThickness]) {
    cube([breadboardDepth, breadboardPlatformBeamWidth, breadboardPlatformHeight]);
  };
  
  //breadboard platform #4
  translate([mainShellThickness, mainWidth/8 * 7 - breadboardPlatformBeamWidth/2, mainShellThickness]) {
    cube([breadboardDepth, breadboardPlatformBeamWidth, breadboardPlatformHeight]);
  };
  
  breadboardFenceHeight = breadboardPlatformHeight + 2;
breadboardFenceThickness = resolution * 2;
  //breadboard fence
  translate([mainShellThickness + breadboardDepth, mainShellThickness, mainShellThickness]) {
    cube([breadboardFenceThickness, mainWidth - mainShellThickness*2, breadboardFenceHeight]);
  }
 
};
  
